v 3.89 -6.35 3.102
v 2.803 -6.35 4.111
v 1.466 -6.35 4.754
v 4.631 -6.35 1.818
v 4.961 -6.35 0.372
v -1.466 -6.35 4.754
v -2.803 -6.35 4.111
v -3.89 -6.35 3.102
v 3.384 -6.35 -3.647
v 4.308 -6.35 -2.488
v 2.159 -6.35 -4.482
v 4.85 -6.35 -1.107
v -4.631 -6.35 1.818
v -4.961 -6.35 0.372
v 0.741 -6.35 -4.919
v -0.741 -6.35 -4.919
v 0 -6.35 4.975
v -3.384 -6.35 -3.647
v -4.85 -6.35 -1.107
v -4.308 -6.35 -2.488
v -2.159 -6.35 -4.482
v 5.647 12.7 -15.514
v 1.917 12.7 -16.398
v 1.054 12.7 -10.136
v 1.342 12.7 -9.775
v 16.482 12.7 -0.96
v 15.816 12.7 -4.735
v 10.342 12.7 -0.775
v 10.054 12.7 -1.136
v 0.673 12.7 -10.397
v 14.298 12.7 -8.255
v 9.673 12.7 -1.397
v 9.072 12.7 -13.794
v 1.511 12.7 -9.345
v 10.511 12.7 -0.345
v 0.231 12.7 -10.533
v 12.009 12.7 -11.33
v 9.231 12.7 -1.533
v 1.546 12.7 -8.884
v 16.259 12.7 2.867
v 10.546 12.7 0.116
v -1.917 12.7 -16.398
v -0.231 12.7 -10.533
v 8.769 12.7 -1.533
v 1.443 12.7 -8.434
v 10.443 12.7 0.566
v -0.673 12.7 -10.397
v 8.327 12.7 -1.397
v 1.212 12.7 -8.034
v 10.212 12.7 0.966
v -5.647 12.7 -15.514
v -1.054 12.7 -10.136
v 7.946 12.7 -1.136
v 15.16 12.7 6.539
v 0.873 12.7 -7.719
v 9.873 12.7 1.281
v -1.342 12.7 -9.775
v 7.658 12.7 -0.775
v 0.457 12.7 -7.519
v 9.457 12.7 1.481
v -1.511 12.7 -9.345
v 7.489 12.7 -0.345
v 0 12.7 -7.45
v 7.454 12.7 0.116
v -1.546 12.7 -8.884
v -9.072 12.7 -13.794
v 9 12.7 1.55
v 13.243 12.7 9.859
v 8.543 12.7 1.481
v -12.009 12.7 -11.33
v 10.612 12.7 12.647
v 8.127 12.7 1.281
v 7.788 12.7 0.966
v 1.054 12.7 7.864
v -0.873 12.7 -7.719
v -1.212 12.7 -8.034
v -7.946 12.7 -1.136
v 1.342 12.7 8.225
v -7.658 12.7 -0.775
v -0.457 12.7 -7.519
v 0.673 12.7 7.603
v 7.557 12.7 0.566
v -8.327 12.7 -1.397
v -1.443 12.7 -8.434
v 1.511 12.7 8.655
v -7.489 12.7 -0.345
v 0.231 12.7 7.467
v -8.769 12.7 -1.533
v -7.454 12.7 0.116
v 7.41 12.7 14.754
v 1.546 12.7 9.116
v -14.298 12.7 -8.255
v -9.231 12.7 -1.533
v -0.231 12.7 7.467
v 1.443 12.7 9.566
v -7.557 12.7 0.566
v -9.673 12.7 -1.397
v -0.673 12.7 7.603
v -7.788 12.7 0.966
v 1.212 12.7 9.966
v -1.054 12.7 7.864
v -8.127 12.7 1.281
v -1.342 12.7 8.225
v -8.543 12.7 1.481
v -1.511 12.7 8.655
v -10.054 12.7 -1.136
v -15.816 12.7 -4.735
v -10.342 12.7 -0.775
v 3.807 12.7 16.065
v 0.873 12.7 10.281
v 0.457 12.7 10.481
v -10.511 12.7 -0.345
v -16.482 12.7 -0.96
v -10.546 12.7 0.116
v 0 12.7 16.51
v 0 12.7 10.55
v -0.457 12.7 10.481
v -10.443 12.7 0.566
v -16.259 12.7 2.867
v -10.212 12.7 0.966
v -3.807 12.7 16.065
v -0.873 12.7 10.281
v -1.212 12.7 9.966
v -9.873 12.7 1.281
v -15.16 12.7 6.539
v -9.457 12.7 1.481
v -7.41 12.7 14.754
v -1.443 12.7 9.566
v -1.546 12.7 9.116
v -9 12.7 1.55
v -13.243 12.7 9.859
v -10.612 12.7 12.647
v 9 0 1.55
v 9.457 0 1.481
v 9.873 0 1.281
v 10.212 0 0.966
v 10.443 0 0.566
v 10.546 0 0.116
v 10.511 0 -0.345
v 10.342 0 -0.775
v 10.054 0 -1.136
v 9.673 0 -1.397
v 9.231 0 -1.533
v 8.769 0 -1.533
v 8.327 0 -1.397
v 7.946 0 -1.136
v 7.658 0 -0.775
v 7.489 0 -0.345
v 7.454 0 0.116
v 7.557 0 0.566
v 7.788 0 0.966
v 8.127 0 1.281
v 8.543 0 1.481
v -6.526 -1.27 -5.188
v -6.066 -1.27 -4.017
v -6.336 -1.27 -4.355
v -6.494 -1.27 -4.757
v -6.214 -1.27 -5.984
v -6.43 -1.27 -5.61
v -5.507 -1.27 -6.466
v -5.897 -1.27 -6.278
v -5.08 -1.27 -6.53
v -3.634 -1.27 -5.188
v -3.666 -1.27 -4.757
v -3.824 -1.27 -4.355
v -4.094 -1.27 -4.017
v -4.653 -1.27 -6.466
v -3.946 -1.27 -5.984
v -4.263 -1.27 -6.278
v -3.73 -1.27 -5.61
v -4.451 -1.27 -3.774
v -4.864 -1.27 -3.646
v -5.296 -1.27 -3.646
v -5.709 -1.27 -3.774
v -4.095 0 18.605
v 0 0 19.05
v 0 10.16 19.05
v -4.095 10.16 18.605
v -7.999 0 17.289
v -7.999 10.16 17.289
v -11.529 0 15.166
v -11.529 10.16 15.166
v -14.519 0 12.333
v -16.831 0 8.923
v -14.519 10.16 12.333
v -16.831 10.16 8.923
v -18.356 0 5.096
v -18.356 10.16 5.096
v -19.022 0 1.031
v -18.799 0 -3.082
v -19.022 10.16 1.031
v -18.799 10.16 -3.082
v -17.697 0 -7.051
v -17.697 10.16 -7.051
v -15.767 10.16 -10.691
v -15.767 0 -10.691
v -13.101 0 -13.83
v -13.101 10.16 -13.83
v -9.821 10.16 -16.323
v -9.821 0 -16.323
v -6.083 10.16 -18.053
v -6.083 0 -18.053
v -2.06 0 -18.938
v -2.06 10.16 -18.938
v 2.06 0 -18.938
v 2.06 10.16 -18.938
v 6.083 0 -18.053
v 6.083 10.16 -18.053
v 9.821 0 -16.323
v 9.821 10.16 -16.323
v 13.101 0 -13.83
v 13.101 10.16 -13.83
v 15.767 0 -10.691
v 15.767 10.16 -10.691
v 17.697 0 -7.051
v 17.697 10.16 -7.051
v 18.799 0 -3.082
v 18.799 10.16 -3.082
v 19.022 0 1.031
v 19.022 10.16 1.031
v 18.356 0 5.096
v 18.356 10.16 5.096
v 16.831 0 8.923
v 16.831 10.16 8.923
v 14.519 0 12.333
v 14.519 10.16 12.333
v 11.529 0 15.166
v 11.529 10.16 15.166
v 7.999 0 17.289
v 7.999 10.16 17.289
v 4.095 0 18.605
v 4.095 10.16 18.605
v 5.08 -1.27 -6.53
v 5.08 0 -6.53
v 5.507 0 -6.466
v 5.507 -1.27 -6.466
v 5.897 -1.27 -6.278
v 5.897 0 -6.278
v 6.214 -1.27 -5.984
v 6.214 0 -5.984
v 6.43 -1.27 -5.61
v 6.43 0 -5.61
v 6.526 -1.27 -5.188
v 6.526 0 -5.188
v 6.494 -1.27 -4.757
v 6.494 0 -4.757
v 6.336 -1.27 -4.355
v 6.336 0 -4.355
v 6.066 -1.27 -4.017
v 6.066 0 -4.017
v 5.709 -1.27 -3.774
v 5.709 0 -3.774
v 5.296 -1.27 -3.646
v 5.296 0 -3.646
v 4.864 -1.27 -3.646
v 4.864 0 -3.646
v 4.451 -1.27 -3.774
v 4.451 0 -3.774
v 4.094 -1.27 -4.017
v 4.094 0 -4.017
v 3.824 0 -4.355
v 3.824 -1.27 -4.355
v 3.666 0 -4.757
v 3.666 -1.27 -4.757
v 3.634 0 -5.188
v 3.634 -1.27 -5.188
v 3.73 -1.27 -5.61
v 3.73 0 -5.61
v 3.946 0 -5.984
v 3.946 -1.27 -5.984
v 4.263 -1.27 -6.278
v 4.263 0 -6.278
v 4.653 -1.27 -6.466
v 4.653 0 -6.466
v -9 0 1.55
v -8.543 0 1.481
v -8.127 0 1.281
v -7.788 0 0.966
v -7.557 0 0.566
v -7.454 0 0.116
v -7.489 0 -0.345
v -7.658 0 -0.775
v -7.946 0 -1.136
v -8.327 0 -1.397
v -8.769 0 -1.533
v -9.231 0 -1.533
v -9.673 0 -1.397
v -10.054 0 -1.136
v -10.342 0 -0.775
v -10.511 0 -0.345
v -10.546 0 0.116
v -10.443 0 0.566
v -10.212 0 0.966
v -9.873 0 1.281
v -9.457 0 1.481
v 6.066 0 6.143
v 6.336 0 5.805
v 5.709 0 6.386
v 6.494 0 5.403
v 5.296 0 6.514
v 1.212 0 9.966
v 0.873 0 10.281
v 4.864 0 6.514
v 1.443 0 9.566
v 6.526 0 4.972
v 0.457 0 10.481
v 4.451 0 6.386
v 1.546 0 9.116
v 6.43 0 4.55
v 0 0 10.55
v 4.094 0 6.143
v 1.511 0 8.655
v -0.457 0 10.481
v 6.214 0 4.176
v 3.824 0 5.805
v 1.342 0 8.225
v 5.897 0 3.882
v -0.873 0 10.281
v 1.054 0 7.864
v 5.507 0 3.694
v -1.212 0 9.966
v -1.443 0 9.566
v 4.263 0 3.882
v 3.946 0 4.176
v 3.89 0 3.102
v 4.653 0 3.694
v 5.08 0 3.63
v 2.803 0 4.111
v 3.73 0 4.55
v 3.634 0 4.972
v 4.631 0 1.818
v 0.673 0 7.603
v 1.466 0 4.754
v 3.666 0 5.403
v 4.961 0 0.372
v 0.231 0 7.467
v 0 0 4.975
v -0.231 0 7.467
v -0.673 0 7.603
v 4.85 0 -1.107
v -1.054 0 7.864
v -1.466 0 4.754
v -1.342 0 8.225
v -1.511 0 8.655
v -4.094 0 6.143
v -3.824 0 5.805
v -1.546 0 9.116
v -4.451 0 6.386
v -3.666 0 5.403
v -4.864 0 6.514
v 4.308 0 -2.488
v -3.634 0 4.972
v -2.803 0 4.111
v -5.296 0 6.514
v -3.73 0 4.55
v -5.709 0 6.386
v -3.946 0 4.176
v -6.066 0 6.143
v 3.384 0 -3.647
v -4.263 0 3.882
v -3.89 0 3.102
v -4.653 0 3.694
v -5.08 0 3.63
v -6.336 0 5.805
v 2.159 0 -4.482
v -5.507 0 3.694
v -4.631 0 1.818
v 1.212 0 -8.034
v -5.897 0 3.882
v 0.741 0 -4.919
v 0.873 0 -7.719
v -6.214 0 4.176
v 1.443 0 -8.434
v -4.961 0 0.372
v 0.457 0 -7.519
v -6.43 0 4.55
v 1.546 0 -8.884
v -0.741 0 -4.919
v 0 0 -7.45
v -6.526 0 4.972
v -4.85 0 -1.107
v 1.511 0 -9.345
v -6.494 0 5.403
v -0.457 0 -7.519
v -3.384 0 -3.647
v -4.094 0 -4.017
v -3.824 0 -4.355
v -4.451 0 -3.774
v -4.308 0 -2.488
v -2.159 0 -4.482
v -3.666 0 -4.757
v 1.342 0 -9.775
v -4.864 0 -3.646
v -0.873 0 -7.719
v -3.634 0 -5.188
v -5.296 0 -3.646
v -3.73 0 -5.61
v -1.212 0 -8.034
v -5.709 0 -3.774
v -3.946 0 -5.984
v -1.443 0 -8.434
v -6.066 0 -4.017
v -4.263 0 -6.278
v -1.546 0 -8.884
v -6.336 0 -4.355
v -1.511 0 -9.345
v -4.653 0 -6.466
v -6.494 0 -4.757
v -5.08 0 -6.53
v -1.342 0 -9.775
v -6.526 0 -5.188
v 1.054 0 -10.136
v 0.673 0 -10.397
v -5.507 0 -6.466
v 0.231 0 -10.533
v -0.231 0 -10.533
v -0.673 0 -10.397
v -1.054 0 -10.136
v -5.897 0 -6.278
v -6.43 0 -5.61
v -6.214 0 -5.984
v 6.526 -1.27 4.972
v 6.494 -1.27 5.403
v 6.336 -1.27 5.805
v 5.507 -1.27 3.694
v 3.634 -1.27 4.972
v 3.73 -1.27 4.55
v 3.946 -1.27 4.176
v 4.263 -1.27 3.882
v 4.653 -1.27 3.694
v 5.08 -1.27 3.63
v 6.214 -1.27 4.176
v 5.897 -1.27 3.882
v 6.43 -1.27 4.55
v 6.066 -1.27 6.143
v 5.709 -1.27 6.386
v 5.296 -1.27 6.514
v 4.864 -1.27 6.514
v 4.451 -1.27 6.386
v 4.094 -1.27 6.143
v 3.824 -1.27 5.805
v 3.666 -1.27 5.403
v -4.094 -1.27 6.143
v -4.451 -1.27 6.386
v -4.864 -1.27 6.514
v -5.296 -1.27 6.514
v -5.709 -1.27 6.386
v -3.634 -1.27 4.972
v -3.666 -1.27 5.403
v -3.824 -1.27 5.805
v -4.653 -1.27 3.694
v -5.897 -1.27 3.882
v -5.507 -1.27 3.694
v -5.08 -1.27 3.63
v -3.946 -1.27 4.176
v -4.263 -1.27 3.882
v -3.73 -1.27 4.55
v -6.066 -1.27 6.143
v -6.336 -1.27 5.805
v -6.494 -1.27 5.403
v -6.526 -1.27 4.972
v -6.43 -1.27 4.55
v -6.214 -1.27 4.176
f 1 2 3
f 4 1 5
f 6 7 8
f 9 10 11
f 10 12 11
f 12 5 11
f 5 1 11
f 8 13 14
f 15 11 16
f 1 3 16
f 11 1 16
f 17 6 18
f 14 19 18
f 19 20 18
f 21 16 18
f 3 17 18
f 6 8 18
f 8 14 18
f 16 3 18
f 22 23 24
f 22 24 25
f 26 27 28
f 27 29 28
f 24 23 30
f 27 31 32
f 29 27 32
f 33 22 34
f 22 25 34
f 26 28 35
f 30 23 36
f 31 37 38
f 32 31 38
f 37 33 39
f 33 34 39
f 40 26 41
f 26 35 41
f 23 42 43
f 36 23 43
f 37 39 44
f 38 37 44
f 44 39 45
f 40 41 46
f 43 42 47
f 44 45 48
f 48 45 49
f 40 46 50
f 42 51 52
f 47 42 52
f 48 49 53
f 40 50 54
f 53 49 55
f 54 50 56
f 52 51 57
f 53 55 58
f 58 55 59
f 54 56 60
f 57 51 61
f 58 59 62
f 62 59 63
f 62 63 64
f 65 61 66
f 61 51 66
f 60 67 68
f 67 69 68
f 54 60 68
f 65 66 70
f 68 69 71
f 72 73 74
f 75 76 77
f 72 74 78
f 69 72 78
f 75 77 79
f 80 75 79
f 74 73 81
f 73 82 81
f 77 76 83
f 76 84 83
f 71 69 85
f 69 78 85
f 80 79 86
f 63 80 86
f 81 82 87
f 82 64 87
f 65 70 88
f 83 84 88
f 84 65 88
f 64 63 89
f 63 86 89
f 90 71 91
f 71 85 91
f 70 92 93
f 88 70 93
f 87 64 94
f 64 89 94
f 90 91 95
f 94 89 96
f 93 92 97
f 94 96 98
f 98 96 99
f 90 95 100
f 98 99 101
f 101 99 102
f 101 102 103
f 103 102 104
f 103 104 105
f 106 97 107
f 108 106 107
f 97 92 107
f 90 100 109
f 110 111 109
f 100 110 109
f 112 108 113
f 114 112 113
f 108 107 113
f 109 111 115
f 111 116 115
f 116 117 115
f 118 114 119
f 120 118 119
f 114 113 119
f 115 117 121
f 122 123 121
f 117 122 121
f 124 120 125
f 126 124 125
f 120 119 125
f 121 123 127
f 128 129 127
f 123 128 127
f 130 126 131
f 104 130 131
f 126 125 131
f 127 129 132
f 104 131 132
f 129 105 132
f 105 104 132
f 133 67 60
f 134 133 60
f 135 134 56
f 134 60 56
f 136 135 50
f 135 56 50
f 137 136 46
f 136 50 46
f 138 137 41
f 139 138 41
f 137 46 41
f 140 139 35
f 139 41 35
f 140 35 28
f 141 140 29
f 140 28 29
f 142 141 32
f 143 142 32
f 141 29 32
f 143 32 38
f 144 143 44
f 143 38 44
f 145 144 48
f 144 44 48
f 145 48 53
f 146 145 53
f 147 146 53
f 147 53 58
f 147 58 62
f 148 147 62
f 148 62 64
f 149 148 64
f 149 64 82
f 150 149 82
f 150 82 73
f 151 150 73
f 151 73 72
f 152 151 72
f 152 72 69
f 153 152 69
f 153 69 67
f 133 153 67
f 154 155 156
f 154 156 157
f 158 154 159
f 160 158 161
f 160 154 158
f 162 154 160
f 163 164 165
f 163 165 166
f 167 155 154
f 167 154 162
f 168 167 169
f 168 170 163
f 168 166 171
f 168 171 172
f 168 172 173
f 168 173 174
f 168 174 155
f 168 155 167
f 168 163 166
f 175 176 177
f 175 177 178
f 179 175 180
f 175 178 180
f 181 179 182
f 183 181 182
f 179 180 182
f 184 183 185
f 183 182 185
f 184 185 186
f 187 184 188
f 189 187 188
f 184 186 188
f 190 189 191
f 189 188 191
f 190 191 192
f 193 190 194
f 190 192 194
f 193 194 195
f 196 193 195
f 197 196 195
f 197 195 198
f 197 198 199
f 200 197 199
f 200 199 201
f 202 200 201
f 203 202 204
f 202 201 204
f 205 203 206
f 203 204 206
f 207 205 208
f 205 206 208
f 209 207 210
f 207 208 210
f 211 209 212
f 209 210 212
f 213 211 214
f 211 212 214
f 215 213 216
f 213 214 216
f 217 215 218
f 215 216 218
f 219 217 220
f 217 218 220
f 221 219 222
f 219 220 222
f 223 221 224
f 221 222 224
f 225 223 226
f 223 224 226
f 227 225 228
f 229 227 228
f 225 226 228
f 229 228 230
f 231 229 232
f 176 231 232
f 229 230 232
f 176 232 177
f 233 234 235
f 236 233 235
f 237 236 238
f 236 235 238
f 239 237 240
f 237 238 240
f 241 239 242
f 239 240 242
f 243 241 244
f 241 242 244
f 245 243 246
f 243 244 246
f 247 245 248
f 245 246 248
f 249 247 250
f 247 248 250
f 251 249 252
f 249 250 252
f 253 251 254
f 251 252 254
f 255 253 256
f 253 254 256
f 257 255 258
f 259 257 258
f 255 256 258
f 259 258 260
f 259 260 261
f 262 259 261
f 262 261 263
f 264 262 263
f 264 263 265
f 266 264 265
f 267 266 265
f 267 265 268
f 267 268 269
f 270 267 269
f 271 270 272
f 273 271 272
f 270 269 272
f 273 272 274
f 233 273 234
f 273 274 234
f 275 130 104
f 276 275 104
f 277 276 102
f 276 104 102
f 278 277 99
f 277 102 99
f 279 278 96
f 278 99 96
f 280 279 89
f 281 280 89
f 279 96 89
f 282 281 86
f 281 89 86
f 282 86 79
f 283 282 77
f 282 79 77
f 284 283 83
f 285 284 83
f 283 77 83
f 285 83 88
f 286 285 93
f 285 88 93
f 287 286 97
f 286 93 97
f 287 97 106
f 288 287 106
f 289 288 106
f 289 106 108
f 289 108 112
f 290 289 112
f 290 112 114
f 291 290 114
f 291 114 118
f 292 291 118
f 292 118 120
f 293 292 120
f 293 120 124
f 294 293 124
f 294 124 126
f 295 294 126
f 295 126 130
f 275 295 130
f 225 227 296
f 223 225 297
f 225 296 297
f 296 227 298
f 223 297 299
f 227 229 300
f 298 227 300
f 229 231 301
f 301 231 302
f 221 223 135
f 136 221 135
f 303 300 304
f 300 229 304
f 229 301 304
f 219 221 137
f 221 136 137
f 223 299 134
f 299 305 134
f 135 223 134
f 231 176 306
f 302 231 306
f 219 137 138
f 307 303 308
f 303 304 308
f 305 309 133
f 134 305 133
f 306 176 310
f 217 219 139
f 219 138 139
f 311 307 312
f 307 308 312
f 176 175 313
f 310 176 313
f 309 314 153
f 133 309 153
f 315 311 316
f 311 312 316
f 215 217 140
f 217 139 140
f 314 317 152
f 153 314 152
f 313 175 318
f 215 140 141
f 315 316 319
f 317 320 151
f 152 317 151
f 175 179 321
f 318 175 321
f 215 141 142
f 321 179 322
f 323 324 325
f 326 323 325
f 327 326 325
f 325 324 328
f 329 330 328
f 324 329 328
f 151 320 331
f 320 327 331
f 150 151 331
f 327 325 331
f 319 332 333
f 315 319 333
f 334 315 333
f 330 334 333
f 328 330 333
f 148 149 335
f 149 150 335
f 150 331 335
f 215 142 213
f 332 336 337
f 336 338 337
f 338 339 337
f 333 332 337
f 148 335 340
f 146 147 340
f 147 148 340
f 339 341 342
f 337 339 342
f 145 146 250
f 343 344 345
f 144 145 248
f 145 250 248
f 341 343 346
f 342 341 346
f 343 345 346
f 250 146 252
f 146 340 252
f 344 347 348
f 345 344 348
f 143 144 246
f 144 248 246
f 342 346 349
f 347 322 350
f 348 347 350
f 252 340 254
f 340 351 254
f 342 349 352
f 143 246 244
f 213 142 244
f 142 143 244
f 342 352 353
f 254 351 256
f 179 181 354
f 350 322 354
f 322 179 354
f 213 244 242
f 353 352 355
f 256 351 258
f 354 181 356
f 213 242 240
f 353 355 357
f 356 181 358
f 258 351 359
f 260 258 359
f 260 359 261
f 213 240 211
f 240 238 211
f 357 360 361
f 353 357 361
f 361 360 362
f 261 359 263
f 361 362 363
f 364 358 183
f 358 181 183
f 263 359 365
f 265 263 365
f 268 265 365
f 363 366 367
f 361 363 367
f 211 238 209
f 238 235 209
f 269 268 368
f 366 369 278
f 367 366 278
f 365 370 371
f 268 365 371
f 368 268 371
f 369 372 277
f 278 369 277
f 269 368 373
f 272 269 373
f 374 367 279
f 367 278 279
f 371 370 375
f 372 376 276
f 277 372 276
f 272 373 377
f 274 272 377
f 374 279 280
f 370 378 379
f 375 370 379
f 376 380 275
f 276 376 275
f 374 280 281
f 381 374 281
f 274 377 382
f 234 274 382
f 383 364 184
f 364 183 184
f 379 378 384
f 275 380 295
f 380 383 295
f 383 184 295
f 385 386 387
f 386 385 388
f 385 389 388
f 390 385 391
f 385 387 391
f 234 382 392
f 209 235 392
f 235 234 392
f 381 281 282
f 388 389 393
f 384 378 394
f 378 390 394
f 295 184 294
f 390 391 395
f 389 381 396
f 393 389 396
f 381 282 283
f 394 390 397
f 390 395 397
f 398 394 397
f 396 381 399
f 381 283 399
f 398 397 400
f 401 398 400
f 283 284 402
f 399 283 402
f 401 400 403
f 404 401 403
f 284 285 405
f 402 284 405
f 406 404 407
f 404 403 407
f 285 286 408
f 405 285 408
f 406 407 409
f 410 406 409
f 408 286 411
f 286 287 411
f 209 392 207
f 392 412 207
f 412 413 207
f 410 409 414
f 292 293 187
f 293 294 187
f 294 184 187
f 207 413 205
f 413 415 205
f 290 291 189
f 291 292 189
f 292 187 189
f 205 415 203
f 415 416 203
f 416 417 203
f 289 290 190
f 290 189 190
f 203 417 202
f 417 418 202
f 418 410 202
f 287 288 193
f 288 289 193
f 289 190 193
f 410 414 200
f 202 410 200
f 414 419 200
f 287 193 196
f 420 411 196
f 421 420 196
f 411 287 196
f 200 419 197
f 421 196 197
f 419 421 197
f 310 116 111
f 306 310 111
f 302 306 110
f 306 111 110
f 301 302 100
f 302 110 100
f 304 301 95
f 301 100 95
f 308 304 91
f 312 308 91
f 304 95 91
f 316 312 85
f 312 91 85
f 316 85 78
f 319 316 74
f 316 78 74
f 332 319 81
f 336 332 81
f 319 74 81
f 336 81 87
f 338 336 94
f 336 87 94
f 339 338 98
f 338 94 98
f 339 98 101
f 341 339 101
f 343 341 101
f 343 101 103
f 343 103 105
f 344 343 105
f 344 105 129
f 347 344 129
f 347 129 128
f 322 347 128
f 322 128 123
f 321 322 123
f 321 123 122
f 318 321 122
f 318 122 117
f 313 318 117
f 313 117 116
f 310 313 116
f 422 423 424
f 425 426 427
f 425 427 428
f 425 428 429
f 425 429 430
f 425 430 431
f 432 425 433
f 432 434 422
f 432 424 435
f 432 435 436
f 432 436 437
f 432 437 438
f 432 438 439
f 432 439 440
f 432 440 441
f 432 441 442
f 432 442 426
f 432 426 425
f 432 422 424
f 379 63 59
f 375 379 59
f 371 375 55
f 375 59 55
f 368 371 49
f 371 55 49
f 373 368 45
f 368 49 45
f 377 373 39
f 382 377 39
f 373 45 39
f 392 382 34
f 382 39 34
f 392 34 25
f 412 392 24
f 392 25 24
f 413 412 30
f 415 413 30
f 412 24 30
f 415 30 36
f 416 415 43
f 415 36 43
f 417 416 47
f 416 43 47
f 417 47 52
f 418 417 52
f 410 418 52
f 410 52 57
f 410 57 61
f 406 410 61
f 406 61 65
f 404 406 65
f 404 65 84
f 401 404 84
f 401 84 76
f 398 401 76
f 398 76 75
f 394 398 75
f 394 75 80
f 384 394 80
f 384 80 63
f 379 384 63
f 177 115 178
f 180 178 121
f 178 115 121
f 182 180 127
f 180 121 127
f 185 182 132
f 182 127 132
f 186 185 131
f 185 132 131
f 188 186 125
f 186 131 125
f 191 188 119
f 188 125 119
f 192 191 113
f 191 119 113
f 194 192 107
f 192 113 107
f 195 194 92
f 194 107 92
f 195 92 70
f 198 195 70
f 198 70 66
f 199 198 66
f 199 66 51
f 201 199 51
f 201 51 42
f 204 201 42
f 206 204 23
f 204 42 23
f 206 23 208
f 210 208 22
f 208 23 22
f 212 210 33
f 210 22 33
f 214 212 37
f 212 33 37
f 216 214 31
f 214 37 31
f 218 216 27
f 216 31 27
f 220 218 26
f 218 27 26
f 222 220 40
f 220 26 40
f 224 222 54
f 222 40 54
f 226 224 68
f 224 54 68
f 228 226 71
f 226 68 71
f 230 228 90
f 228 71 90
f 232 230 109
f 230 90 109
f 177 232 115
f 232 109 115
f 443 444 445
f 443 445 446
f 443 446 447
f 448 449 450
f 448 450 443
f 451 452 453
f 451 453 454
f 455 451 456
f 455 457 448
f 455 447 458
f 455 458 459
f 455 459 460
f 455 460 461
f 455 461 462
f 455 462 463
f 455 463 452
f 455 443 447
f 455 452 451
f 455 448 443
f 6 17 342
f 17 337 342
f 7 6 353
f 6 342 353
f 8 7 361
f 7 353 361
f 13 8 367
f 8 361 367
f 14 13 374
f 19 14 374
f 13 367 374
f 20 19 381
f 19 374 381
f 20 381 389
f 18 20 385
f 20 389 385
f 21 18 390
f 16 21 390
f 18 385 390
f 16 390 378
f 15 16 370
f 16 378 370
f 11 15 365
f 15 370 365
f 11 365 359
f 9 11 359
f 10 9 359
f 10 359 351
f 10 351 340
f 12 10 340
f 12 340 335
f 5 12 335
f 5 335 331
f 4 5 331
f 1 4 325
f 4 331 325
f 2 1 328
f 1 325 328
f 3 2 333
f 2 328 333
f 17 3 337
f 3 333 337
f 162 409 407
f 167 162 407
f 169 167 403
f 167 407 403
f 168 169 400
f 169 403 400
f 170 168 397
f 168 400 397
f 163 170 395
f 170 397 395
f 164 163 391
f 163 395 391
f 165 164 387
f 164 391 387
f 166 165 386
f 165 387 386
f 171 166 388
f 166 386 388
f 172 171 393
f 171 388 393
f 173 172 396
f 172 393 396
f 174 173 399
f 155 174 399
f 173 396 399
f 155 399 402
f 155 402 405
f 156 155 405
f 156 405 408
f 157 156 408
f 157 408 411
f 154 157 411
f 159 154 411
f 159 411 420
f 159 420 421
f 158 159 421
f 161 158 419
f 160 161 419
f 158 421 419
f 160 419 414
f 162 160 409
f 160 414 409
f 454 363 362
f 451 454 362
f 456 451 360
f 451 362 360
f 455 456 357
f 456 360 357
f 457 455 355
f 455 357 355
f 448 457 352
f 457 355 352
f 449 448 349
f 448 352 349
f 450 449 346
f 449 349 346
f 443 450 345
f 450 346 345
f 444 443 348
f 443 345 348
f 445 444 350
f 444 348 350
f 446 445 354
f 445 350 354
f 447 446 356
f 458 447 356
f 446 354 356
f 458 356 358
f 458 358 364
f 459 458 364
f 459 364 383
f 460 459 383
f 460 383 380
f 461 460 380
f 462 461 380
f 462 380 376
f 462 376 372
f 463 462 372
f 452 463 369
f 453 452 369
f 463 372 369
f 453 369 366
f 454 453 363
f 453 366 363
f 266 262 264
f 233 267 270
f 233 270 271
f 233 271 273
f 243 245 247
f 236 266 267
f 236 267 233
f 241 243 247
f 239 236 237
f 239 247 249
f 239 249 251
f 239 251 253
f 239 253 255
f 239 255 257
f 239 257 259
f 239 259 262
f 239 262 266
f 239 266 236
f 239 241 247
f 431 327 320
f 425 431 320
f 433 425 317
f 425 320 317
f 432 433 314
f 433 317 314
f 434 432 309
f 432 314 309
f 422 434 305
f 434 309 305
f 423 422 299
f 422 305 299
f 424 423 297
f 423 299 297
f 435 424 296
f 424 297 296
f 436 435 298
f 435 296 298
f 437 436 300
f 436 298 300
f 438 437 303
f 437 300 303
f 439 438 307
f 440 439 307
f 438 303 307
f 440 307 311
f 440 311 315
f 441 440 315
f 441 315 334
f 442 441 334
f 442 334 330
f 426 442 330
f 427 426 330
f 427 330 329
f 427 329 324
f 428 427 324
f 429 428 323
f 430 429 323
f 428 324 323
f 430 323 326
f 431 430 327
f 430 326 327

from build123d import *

# Parameters (mm, degrees)
SKETCH2_R           = 1.55
CUT_EXTRUDE1_DEPTH  = 33.995567884
SKETCH3_R           = 1.45
BOSS_EXTRUDE1_DEPTH = 1.27
CHAMFER1_SIZE       = 2.54


with BuildPart() as part:
    # Sketch1 → Revolve1 (revolve)
    with BuildSketch(Plane(origin=(0, 0, 0), x_dir=(0, 0, -1), z_dir=(1, 0, 0))):
        Polygon((0, 0), (0, -6.35), (-4.975, -6.35), (-4.975, 0), (-19.05, 0), (-19.05, 12.7), (0, 12.7), align=None)
    revolve(axis=Axis((0, 12.7, 0), (0, -1, 0)))

    # Sketch2 → Cut-Extrude1 (cut, through all)
    with BuildSketch(Plane(origin=(0, 12.7, 0), x_dir=(1, 0, 0), z_dir=(0, 1, 0))):
        with Locations(Location((0, 9, 0), (0, 0, 270))):
            Circle(SKETCH2_R)
        with Locations(Location((0, -9, 0), (0, 0, 270))):
            Circle(SKETCH2_R)
        with Locations(Location((9, 0, 0), (0, 0, 270))):
            Circle(SKETCH2_R)
        with Locations(Location((-9, 0, 0), (0, 0, 270))):
            Circle(SKETCH2_R)
    extrude(amount=-CUT_EXTRUDE1_DEPTH, mode=Mode.SUBTRACT)

    # Sketch3 → Boss-Extrude1 (add)
    with BuildSketch(Plane.XZ):
        with Locations(Location((-5.08, -5.08, 0), (0, 0, 270))):
            Circle(SKETCH3_R)
        with Locations(Location((-5.08, 5.08, 0), (0, 0, 270))):
            Circle(SKETCH3_R)
        with Locations(Location((5.08, 5.08, 0), (0, 0, 270))):
            Circle(SKETCH3_R)
        with Locations(Location((5.08, -5.08, 0), (0, 0, 270))):
            Circle(SKETCH3_R)
    extrude(amount=BOSS_EXTRUDE1_DEPTH)

    # Chamfer1
    chamfer1_edges = [part.edges().sort_by_distance(p)[0] for p in [
        (0, 12.7, -19.05),
    ]]
    chamfer(chamfer1_edges, length=CHAMFER1_SIZE)


solid = part.part
